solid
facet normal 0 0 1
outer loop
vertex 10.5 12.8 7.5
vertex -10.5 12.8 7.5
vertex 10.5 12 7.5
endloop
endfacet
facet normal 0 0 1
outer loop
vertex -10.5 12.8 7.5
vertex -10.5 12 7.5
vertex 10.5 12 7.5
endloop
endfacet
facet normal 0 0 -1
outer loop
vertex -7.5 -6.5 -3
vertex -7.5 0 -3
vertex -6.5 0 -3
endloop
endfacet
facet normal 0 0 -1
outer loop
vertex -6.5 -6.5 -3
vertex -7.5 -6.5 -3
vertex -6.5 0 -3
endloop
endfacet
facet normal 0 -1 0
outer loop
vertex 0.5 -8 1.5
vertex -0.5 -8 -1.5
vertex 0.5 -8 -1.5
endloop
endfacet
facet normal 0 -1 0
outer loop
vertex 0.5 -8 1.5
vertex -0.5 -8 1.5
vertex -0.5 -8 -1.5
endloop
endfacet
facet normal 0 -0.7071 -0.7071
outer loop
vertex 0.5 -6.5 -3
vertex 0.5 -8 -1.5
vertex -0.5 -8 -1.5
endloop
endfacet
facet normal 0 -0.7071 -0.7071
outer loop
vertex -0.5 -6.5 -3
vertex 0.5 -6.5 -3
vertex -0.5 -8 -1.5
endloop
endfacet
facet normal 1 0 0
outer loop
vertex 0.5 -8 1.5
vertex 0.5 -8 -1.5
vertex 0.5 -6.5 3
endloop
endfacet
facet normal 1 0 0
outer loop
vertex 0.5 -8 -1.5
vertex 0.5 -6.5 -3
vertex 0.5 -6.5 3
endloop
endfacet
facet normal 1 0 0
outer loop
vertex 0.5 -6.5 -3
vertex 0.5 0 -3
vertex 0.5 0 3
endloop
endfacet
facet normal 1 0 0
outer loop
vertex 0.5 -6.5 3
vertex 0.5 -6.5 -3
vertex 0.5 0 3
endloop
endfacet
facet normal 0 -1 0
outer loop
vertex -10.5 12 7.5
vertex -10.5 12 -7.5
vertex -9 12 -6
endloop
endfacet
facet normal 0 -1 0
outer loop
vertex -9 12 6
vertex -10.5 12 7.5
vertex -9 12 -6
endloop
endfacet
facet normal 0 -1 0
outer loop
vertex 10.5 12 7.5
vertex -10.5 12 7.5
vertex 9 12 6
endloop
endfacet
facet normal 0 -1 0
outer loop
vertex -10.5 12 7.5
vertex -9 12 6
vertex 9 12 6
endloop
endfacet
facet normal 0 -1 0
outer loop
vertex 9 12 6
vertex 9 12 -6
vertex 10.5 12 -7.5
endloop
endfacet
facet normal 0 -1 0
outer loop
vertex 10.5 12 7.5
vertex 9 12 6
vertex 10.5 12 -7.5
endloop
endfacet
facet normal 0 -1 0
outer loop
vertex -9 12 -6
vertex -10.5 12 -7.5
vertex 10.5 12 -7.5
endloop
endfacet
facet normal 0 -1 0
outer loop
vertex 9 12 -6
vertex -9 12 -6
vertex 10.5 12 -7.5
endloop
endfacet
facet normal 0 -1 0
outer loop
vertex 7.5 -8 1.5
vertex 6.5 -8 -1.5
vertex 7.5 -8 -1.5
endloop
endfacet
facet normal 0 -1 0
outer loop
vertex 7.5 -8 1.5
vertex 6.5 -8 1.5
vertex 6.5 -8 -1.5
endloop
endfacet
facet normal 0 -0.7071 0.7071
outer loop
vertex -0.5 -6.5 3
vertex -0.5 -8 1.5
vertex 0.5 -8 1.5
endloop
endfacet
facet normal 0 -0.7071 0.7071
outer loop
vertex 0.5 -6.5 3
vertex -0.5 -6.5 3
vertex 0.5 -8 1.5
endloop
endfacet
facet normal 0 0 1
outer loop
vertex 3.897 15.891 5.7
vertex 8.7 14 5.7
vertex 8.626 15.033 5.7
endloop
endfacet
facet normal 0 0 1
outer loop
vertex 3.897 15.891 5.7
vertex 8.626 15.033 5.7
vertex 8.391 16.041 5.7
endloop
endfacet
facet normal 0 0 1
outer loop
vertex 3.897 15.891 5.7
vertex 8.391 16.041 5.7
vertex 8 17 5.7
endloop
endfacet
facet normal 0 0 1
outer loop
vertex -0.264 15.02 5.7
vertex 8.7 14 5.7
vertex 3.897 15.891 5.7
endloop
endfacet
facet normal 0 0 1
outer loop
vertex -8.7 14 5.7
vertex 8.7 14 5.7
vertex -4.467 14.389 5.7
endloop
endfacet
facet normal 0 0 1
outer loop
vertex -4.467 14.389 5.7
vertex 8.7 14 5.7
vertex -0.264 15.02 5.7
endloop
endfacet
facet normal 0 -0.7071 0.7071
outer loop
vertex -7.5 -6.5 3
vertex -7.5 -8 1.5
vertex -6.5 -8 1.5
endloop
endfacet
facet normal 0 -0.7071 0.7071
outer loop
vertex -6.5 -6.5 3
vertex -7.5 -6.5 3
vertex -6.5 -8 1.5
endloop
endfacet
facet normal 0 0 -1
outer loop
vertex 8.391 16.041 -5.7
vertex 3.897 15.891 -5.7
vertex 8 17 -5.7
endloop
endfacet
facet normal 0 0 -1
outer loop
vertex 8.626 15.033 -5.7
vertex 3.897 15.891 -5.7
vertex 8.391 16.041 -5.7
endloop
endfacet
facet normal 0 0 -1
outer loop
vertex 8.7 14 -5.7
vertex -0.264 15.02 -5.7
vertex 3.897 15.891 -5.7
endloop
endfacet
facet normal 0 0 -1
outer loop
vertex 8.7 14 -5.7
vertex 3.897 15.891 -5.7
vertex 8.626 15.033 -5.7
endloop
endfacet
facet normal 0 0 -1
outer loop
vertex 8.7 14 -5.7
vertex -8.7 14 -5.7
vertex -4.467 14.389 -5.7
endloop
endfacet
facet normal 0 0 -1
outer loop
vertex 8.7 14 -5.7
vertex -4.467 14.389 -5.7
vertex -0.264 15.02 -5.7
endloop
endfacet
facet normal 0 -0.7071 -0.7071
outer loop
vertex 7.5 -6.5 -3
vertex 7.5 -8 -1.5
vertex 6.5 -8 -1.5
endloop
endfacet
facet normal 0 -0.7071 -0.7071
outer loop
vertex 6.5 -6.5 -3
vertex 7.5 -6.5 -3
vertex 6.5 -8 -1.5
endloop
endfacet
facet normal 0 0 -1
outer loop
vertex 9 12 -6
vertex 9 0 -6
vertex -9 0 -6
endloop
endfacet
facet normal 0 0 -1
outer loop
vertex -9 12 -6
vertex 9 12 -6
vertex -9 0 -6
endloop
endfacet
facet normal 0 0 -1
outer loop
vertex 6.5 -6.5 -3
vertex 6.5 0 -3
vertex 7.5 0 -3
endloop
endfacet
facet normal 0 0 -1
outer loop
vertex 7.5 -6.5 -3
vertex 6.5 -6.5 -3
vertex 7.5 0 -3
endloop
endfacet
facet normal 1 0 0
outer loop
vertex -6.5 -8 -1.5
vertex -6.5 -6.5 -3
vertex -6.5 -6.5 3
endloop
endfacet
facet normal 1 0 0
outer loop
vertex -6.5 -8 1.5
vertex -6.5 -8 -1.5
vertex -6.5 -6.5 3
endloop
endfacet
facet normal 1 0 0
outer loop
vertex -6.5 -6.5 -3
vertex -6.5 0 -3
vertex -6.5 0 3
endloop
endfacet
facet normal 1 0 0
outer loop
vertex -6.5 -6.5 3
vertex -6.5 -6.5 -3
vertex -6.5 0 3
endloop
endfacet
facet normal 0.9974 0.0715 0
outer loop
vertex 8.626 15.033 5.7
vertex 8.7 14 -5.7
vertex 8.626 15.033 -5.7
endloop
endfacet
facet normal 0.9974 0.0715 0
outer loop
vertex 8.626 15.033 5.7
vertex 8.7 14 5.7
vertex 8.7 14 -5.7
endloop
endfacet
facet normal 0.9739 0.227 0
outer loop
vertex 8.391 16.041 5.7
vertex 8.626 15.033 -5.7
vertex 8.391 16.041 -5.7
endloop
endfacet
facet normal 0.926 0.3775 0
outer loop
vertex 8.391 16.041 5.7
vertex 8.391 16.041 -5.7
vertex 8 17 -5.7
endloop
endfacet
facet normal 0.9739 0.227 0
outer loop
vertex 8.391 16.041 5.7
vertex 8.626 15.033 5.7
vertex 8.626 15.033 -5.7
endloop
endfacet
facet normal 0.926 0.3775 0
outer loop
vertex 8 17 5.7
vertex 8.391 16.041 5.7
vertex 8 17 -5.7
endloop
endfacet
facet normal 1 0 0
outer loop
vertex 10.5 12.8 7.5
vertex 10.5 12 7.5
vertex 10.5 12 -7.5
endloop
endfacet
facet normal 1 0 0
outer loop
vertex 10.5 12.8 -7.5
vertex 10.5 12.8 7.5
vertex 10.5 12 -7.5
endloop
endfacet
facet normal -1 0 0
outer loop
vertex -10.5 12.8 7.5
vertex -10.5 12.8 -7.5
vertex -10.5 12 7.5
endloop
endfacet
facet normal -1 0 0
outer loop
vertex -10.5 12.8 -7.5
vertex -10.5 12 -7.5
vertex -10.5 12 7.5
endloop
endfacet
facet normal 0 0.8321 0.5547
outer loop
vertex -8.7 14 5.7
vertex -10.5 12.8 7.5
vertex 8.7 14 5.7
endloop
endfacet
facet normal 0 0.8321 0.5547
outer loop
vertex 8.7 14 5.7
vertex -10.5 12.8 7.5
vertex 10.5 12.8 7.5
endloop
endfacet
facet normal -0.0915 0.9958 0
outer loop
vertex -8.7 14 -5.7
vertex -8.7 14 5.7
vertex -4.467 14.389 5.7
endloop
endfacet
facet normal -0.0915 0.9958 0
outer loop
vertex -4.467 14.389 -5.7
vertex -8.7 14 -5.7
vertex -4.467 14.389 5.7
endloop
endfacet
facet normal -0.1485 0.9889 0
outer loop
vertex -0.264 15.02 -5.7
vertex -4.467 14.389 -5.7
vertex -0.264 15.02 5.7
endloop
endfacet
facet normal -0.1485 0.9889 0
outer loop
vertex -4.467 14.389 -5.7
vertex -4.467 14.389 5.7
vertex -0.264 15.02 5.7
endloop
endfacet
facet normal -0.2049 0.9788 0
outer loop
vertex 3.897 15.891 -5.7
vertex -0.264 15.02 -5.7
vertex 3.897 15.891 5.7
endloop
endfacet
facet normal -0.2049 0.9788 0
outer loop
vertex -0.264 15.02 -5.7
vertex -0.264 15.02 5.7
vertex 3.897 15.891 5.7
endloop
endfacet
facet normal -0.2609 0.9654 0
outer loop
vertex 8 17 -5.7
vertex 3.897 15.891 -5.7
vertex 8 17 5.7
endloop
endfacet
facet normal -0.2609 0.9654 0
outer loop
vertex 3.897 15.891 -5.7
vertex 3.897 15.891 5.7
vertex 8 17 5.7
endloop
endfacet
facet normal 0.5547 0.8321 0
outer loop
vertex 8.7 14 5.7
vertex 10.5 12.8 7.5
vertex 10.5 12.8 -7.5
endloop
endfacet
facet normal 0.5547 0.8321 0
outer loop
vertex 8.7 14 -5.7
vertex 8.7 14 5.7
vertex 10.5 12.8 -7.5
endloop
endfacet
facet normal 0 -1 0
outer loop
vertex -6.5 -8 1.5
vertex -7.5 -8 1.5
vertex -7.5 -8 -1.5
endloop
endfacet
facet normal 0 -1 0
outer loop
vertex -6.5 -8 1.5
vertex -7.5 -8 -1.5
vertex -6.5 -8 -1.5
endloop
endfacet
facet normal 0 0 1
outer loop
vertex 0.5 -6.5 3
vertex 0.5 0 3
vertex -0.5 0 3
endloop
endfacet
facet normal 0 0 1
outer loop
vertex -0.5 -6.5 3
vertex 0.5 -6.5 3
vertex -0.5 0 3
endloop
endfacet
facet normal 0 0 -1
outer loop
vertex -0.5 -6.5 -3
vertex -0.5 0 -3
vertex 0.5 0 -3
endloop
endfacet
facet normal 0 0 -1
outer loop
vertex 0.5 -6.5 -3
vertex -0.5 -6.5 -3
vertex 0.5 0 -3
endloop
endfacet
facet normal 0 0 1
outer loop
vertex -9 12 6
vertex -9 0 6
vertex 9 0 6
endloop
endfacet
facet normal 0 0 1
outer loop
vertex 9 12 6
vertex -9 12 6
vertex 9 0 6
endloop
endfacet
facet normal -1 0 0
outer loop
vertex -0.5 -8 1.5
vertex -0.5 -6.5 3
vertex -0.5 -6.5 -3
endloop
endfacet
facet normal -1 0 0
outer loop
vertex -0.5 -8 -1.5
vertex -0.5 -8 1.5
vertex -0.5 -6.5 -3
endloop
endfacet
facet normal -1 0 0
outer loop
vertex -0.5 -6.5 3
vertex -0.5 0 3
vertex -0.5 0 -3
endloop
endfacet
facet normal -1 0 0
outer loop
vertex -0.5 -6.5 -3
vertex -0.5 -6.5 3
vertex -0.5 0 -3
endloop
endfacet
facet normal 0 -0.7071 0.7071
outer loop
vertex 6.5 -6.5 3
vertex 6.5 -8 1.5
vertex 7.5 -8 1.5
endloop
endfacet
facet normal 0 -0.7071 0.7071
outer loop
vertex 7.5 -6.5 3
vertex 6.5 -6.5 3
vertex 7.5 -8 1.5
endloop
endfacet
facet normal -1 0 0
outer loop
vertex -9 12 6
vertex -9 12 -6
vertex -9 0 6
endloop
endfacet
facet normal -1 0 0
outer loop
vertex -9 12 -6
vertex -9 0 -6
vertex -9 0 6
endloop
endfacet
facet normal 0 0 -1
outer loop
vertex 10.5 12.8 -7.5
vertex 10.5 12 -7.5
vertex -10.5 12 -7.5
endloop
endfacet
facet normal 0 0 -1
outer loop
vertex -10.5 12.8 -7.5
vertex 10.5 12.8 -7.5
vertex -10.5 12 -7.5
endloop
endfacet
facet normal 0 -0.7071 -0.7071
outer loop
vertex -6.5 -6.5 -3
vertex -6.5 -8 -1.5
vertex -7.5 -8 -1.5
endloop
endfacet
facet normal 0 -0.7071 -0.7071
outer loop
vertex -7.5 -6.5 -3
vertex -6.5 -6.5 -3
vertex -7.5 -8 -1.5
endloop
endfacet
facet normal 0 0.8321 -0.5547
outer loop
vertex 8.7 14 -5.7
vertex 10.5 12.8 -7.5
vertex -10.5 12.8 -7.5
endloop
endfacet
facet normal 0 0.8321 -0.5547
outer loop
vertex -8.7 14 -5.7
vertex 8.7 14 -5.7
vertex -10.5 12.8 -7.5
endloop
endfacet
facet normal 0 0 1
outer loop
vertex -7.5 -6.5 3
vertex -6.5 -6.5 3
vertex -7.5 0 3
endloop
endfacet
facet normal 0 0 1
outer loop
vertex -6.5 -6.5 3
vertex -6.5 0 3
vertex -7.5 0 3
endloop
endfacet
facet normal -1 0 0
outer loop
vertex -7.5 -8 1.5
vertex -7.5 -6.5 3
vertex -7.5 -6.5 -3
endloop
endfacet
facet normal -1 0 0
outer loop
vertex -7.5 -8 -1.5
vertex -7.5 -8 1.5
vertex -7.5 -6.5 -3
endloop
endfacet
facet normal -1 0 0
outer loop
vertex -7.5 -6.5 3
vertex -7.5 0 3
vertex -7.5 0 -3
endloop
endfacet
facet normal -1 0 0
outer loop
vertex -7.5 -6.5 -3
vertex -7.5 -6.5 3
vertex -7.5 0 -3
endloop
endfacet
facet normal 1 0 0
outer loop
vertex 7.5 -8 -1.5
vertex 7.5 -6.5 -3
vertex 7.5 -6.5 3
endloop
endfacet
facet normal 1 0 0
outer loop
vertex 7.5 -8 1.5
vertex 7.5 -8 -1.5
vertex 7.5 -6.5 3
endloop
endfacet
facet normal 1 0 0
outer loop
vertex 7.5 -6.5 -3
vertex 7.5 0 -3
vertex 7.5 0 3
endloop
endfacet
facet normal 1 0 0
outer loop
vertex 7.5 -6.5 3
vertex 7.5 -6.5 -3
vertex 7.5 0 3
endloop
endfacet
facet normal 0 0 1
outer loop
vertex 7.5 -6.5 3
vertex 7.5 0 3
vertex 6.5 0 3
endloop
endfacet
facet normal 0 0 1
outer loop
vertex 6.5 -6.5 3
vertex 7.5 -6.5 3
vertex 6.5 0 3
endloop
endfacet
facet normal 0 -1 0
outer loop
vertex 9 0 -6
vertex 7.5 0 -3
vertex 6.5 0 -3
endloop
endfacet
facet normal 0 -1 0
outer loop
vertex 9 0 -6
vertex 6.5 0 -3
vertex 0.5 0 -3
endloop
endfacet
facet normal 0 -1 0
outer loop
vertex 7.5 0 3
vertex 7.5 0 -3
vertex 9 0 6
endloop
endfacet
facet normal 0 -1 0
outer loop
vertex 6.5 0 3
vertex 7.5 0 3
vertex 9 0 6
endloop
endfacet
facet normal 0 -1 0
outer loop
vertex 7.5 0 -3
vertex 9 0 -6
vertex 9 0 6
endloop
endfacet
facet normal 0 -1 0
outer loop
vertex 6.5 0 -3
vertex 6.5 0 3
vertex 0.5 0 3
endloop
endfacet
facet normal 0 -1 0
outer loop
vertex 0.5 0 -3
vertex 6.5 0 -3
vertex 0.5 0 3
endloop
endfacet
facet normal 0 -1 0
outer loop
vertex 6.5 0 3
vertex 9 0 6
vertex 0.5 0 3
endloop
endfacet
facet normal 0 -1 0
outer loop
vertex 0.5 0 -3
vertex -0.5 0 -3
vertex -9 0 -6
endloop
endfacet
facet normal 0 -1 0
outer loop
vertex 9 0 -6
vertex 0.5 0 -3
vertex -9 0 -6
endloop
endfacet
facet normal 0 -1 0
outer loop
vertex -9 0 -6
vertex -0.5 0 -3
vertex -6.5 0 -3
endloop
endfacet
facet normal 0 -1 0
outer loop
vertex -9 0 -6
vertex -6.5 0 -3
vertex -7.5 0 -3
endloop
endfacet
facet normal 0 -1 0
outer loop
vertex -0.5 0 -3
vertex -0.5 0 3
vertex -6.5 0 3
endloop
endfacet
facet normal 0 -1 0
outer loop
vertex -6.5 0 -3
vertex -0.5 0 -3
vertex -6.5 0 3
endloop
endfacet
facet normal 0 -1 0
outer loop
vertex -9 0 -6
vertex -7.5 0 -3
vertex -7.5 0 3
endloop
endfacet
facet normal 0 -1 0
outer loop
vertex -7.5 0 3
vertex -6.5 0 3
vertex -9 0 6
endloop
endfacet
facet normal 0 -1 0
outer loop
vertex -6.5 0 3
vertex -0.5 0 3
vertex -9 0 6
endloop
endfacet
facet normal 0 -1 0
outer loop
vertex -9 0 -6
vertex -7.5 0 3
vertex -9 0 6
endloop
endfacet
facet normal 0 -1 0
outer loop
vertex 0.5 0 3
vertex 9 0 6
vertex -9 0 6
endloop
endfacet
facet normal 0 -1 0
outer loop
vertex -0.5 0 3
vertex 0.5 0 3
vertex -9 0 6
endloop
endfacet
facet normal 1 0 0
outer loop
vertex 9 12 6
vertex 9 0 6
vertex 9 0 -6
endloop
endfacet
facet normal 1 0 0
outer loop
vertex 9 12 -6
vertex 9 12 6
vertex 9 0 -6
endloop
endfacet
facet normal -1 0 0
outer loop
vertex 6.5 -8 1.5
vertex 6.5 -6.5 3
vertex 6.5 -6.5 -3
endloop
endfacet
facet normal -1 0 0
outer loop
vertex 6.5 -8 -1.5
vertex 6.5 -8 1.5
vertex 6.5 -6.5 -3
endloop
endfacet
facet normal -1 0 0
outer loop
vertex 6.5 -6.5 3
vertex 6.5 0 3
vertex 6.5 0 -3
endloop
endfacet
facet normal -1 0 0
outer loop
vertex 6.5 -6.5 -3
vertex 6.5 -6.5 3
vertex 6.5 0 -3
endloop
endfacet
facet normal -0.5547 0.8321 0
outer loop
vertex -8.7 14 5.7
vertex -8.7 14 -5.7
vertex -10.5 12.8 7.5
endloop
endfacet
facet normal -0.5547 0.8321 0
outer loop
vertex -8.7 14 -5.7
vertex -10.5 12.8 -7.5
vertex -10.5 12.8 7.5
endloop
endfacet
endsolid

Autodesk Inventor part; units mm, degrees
ref_plane "YZ Plane" through (0, 0, 0) normal (1, 0, 0) x (0, 1, 0)
ref_plane "XZ Plane" through (0, 0, 0) normal (0, 1, 0) x (-1, 0, 0)
ref_plane "XY Plane" through (0, 0, 0) normal (0, 0, 1) x (1, 0, 0)
sketch "Sketch1" plane through (0, 0, 0) normal (0, 1, 0) x (-1, 0, 0)
  line L0 (-9, 6) -> (-9, -6)
  line L1 (-9, -6) -> (9, -6)
  line L2 (9, -6) -> (9, 6)
  line L3 (9, 6) -> (-9, 6)
  line L4 (-9, 6) -> (9, -6) construction
  line L5 (-9, -6) -> (9, 6) construction
  point P0 (0, 0)
  dimension "d0" = 12
  dimension "d1" = 18
extrude "Extrusion1" add sketch "Sketch1" along normal blind 12
sketch "Sketch2" plane through (0, 12, 0) normal (0, 1, 0) x (1, 0, 0)
  line L0 (10.5, -7.5) -> (10.5, 7.5)
  line L1 (10.5, 7.5) -> (-10.5, 7.5)
  line L2 (-10.5, 7.5) -> (-10.5, -7.5)
  line L3 (-10.5, -7.5) -> (10.5, -7.5)
  line L4 (10.5, -7.5) -> (-10.5, 7.5) construction
  line L5 (10.5, 7.5) -> (-10.5, -7.5) construction
  point P0 (0, 0)
  dimension "d4" = 15
  dimension "d5" = 21
extrude "Extrusion2" add sketch "Sketch2" along normal blind 2
chamfer "Chamfer1" distance 1.8 distance2 1.2 1 edges at (10.5, 14, 0) measured on face at (-3.5, 14, -2.5)
chamfer "Chamfer2" distance 1.8 distance2 1.2 1 edges at (-0.9, 14, 7.5) measured on face at (-4.1, 14, -2.5)
chamfer "Chamfer3" distance 1.8 distance2 1.2 1 edges at (-10.5, 14, -0.9) measured on face at (-4.1, 14, -3.1)
chamfer "Chamfer4" distance 1.8 distance2 1.2 1 edges at (0, 14, -7.5) measured on face at (2.9, 14, 1.3)
sketch "Sketch3" plane through (0, 14, 0) normal (0, 1, 0) x (1, 0, 0)
  line L0 (-8.7, 5.7) -> (8.7, 5.7) projected
  line L1 (-8.7, -5.7) -> (-8.7, 5.7) projected
  line L2 (8.7, -5.7) -> (-8.7, -5.7) projected
  line L3 (8.7, 5.7) -> (8.7, -5.7) projected
  point P0 (0, 0)
extrude "Extrusion3" add sketch "Sketch3" along normal blind 3
sketch "Sketch4" plane through (-8.7, 14, 5.7) normal (0, 0, 1) x (1, 0, 0)
  line L0 (17.4, 0) -> (0, 0) projected
  line L1 (17.4, 0) -> (17.4, 3) projected
  line L2 (0, 3) -> (17.4, 3) projected
  line L3 (0, 0) -> (0, 3) projected
  line L4 (17.4, 0) -> (17.4, 3)
  line L5 (17.4, 3) -> (0, 3)
  line L6 (0, 3) -> (0, 0)
  line L7 (0, 0) -> (17.4, 0)
  line L8 (17.4, 0) -> (16.7, 0)
  line L9 (17.4, 0) -> (0, 0) projected
  line L10 (16.7, 0) -> (16.7, 3)
  line L11 (0, 3) -> (17.4, 3) projected
  arc A0 (0, 0) -> (16.7, 3) centre (-4.649, 73.861) ccw
  arc A1 (17.4, 0) -> (16.7, 3) centre (10.8425, 0.0516) ccw
  point P0 (8.7, -14)
  dimension "d24" = 0.7
extrude "Extrusion4" cut sketch "Sketch4" against normal through all contours A1 L2 L1 | A0 L3 L2
sketch "Sketch5" plane through (0, 0, 0) normal (0, -1, 0) x (1, 0, 0)
  line L0 (0.5, -3) -> (0.5, 3)
  line L1 (0.5, 3) -> (-0.5, 3)
  line L2 (-0.5, 3) -> (-0.5, -3)
  line L3 (-0.5, -3) -> (0.5, -3)
  line L4 (0.5, -3) -> (-0.5, 3) construction
  line L5 (0.5, 3) -> (-0.5, -3) construction
  line L6 (0, 0) -> (-7, 0)
  line L7 (0, 0) -> (7, 0)
  line L8 (-6.5, -3) -> (-6.5, 3)
  line L9 (-6.5, 3) -> (-7.5, 3)
  line L10 (-7.5, 3) -> (-7.5, -3)
  line L11 (-7.5, -3) -> (-6.5, -3)
  line L12 (-6.5, -3) -> (-7.5, 3) construction
  line L13 (-6.5, 3) -> (-7.5, -3) construction
  line L14 (7.5, -3) -> (7.5, 3)
  line L15 (7.5, 3) -> (6.5, 3)
  line L16 (6.5, 3) -> (6.5, -3)
  line L17 (6.5, -3) -> (7.5, -3)
  line L18 (7.5, -3) -> (6.5, 3) construction
  line L19 (7.5, 3) -> (6.5, -3) construction
  dimension "d27" = 6
  dimension "d28" = 1
  dimension "d29" = 7
  dimension "d30" = 7
  dimension "d31" = 1
  dimension "d32" = 1
  dimension "d41" = 6
  dimension "d42" = 6
extrude "Extrusion5" add sketch "Sketch5" along normal blind 8
chamfer "Chamfer5" distance 1.5 angle 45 6 edges at (7, -8, -3) (7, -8, 3) (0, -8, 3) (-7, -8, 3) (-7, -8, -3) (0, -8, -3)
properties part number "Toggle switch"
